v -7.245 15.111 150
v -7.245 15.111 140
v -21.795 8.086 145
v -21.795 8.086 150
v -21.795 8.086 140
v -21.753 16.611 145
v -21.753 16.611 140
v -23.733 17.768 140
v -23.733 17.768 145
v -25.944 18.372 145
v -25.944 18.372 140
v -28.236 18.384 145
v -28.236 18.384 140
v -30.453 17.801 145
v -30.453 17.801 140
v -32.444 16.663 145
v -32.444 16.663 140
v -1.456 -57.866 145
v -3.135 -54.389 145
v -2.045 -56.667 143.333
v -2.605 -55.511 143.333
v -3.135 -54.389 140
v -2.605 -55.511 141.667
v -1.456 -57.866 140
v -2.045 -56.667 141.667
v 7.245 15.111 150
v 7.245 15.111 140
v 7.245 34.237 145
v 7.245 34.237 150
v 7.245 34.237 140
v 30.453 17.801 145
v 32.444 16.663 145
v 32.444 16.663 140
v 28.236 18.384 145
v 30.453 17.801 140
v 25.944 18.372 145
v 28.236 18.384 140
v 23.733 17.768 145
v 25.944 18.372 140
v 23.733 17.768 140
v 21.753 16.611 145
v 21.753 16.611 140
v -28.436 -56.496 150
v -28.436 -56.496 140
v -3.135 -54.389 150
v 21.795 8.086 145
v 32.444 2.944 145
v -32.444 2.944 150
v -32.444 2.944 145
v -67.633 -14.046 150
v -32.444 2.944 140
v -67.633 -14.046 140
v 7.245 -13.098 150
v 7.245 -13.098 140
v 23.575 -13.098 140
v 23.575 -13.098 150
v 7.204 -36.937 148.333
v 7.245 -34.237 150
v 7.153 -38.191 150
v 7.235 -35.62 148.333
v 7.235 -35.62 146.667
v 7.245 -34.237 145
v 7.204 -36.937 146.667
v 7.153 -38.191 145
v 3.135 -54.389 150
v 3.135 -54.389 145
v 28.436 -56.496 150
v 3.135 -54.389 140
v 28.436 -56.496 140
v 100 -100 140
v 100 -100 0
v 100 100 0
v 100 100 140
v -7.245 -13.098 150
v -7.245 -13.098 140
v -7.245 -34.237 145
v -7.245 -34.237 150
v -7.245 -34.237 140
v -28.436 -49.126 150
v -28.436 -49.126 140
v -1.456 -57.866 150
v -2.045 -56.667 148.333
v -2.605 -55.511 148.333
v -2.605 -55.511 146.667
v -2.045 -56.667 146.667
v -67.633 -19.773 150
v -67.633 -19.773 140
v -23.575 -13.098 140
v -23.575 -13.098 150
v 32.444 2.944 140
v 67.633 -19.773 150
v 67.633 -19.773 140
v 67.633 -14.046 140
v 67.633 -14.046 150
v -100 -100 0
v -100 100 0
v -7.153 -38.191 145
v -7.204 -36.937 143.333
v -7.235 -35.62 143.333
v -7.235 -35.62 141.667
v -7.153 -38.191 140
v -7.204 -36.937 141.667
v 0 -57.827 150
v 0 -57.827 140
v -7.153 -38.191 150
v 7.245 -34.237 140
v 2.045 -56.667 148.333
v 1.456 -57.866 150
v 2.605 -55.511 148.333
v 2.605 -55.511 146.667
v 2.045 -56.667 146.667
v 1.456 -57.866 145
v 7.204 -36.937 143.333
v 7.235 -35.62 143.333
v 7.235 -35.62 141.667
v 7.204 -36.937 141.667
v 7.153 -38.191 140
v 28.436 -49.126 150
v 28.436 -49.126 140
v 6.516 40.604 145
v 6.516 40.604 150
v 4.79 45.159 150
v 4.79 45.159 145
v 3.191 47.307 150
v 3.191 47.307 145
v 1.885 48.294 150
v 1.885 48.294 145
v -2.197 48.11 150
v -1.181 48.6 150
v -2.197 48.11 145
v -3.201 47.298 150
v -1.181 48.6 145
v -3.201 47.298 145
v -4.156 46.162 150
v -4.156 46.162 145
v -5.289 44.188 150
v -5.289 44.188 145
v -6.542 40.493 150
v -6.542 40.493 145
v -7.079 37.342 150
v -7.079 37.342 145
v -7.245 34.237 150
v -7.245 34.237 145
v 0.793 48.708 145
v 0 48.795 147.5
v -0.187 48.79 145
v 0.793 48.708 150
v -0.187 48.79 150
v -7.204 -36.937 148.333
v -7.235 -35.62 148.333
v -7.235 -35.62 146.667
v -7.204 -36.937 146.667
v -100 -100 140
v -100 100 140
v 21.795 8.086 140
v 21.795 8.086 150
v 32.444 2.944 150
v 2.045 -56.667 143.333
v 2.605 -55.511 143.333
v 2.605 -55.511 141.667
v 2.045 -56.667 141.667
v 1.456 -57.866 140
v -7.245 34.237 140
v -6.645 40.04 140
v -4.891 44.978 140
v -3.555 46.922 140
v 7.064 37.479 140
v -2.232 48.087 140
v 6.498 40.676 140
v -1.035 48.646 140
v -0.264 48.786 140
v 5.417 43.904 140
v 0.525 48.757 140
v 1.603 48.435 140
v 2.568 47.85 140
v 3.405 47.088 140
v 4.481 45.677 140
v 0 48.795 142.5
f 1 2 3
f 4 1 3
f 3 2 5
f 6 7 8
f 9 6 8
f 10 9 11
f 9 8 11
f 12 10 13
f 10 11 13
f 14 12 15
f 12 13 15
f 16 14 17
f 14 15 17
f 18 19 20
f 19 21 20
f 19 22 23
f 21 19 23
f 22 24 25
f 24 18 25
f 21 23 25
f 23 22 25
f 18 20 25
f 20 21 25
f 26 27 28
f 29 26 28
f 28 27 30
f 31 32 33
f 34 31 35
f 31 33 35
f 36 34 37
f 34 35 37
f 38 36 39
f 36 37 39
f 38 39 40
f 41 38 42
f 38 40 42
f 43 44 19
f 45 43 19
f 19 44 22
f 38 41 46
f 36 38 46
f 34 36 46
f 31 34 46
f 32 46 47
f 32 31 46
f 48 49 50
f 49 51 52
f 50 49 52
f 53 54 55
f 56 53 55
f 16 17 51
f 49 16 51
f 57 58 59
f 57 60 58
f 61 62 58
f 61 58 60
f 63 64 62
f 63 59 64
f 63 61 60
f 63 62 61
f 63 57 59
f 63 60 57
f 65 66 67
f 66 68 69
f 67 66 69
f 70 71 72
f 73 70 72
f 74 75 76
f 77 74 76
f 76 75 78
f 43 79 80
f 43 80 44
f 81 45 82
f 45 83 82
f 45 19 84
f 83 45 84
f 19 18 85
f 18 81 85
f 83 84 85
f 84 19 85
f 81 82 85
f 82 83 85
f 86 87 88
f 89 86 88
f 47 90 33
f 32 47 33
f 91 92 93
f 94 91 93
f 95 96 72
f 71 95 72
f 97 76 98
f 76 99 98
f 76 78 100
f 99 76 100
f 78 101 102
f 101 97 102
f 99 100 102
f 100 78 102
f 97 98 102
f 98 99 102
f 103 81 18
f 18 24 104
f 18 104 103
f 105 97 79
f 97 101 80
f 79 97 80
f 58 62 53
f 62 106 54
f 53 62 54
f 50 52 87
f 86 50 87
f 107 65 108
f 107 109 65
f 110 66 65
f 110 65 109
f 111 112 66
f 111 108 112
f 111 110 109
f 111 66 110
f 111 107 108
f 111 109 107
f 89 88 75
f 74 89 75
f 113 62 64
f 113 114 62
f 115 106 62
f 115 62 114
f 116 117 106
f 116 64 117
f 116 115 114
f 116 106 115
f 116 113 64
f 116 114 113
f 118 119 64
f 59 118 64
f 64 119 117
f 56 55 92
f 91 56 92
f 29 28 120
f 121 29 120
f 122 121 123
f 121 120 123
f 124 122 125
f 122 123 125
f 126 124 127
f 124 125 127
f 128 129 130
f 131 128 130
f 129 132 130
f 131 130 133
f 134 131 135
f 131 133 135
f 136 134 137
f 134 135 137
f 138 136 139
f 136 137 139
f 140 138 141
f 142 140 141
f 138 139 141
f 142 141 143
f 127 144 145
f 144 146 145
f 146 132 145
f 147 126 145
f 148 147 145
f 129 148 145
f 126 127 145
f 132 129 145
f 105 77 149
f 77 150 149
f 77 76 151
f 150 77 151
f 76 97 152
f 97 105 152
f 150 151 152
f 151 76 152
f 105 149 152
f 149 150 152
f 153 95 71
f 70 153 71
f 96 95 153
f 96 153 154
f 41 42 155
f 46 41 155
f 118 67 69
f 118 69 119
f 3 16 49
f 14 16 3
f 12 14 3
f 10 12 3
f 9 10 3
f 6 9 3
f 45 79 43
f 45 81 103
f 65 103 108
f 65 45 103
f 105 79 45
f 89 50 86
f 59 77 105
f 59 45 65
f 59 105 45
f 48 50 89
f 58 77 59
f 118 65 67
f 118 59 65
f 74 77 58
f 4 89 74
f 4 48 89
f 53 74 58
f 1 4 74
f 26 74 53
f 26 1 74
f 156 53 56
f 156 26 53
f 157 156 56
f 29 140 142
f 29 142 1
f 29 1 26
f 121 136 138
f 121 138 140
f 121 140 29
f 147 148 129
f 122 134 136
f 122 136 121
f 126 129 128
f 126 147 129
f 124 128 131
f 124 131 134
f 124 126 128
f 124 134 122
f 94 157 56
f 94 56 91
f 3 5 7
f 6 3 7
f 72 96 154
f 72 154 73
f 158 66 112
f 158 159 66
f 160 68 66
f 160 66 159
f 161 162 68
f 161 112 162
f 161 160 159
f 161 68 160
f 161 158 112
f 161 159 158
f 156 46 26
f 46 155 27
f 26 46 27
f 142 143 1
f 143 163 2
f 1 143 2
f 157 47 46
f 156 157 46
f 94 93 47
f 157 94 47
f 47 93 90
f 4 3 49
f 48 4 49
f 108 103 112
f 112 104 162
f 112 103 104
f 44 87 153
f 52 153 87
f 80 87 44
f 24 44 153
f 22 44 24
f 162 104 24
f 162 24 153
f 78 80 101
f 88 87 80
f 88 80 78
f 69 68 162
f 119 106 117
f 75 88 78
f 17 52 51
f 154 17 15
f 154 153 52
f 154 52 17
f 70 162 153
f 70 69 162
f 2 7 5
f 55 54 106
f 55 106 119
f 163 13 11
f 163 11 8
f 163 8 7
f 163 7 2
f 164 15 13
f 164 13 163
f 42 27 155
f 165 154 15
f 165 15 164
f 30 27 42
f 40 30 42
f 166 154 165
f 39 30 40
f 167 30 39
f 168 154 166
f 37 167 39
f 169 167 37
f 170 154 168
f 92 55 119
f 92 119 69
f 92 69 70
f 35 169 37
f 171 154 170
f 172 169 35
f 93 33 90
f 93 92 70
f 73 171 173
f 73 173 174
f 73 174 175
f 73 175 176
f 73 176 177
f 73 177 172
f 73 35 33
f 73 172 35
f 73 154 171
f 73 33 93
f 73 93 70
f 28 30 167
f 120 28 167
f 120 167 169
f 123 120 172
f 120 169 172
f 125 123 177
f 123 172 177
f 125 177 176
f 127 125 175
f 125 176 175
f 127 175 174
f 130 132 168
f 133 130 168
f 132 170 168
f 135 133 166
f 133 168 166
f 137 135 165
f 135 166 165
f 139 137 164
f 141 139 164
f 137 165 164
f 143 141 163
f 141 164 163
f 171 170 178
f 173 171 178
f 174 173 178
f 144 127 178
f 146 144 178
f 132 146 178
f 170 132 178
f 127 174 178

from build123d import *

# Parameters (mm, degrees)
F0_W     = 200
F0_H     = 200
F1_DEPTH = 140
F2_DEPTH = 140
F3_DEPTH = 145
F4_DEPTH = 150
F5_DEPTH = 130


with BuildPart() as f1:
    # F0 (on Top) → F1 (new body)
    with BuildSketch(Plane.XY):
        Rectangle(F0_W, F0_H)
        with BuildLine():
            add(Edge.make_bspline(
                [(7.2454415782, 34.2370129494), (7.2454415782, 48.7951978413), (0, 48.7951978413), (-7.2454415782, 48.7951978413), (-7.2454415782, 34.2370129494)],
                knots=[4.7123889804, 4.7123889804, 4.7123889804, 6.2831853072, 6.2831853072, 7.853981634, 7.853981634, 7.853981634], degree=2, weights=[1, 0.7071067812, 1, 0.7071067812, 1]))
            Line((7.2454415782, 34.2370129494), (7.2454415782, 15.1109112501))
            Line((7.2454415782, 15.1109112501), (21.7954180783, 8.0856784731))
            Line((21.7954180783, 8.0856784731), (21.7534018032, 16.610871316))
            ThreePointArc((21.7534018032, 16.610871316), (27.0897500943, 18.4530874606), (32.4439415934, 16.6633928502))
            Line((32.4439415934, 16.6633928502), (32.4439415934, 2.9442023734))
            Line((32.4439415934, 2.9442023734), (67.6326961509, -14.0461475353))
            Line((67.6326961509, -14.0461475353), (67.6326961509, -19.7732619358))
            Line((67.6326961509, -19.7732619358), (23.5754315722, -13.0982023901))
            Line((23.5754315722, -13.0982023901), (7.2454415782, -13.0982023901))
            Line((7.2454415782, -13.0982023901), (7.2454415782, -34.2370129494))
            add(Edge.make_bspline(
                [(7.2454415782, -34.2370129494), (7.2454415782, -35.6548618262), (7.2142066873, -36.9668416965), (7.1527191063, -38.1911703848)],
                knots=[0, 0, 0, 0, 2.9587160624, 2.9587160624, 2.9587160624, 2.9587160624], degree=3))
            Line((7.1527191063, -38.1911703848), (28.4360707366, -49.1262911818))
            Line((28.4360707366, -49.1262911818), (28.4360707366, -56.4963517135))
            Line((28.4360707366, -56.4963517135), (3.1353018663, -54.3887936468))
            add(Edge.make_bspline(
                [(3.1353018663, -54.3887936468), (2.61930295, -55.4977071467), (2.0588825896, -56.641790632), (1.4564413795, -57.8655702387)],
                knots=[20.3419378234, 20.3419378234, 20.3419378234, 20.3419378234, 24.3273764075, 24.3273764075, 24.3273764075, 24.3273764075], degree=3))
            Line((1.4564413795, -57.8655702387), (0, -57.8274615109))
            Line((0, -57.8274615109), (-1.4564413795, -57.8655702387))
            add(Edge.make_bspline(
                [(-3.1353018663, -54.3887936468), (-2.61930295, -55.4977071467), (-2.0588825896, -56.641790632), (-1.4564413795, -57.8655702387)],
                knots=[20.3419378234, 20.3419378234, 20.3419378234, 20.3419378234, 24.3273764075, 24.3273764075, 24.3273764075, 24.3273764075], degree=3))
            Line((-3.1353018663, -54.3887936468), (-28.4360707366, -56.4963517135))
            Line((-28.4360707366, -56.4963517135), (-28.4360707366, -49.1262911818))
            Line((-28.4360707366, -49.1262911818), (-7.1527191063, -38.1911703848))
            add(Edge.make_bspline(
                [(-7.2454415782, -34.2370129494), (-7.2454415782, -35.6548618262), (-7.2142066873, -36.9668416965), (-7.1527191063, -38.1911703848)],
                knots=[0, 0, 0, 0, 2.9587160624, 2.9587160624, 2.9587160624, 2.9587160624], degree=3))
            Line((-7.2454415782, -34.2370129494), (-7.2454415782, -13.0982023901))
            Line((-7.2454415782, -13.0982023901), (-23.5754315722, -13.0982023901))
            Line((-23.5754315722, -13.0982023901), (-67.6326961509, -19.7732619358))
            Line((-67.6326961509, -19.7732619358), (-67.6326961509, -14.0461475353))
            Line((-67.6326961509, -14.0461475353), (-32.4439415934, 2.9442023734))
            Line((-32.4439415934, 2.9442023734), (-32.4439415934, 16.6633928502))
            ThreePointArc((-32.4439415934, 16.6633928502), (-27.0897500943, 18.4530874606), (-21.7534018032, 16.610871316))
            Line((-21.7534018032, 16.610871316), (-21.7954180783, 8.0856784731))
            Line((-21.7954180783, 8.0856784731), (-7.2454415782, 15.1109112501))
            Line((-7.2454415782, 15.1109112501), (-7.2454415782, 34.2370129494))
        make_face(mode=Mode.SUBTRACT)
        Polygon((-7.2454415782, -13.0982023901), (-7.2454415782, 15.1109112501), (-21.7954180783, 8.0856784731), (-32.4439415934, 2.9442023734), (-67.6326961509, -14.0461475353), (-67.6326961509, -19.7732619358), (-23.5754315722, -13.0982023901), align=None)
        with BuildLine():
            Line((-32.4439415934, 2.9442023734), (-21.7954180783, 8.0856784731))
            Line((-21.7954180783, 8.0856784731), (-21.7534018032, 16.610871316))
            ThreePointArc((-21.7534018032, 16.610871316), (-27.0897500943, 18.4530874606), (-32.4439415934, 16.6633928502))
            Line((-32.4439415934, 16.6633928502), (-32.4439415934, 2.9442023734))
        make_face()
        with BuildLine():
            add(Edge.make_bspline(
                [(-7.1527191063, -38.1911703848), (-6.791463672, -45.384417945), (-5.3859258319, -49.5520639177), (-3.1353018663, -54.3887936468)],
                knots=[2.9587160624, 2.9587160624, 2.9587160624, 2.9587160624, 20.3419378234, 20.3419378234, 20.3419378234, 20.3419378234], degree=3))
            Line((-7.1527191063, -38.1911703848), (-28.4360707366, -49.1262911818))
            Line((-28.4360707366, -49.1262911818), (-28.4360707366, -56.4963517135))
            Line((-28.4360707366, -56.4963517135), (-3.1353018663, -54.3887936468))
        make_face()
        with BuildLine():
            Line((28.4360707366, -49.1262911818), (7.1527191063, -38.1911703848))
            add(Edge.make_bspline(
                [(7.1527191063, -38.1911703848), (6.791463672, -45.384417945), (5.3859258319, -49.5520639177), (3.1353018663, -54.3887936468)],
                knots=[2.9587160624, 2.9587160624, 2.9587160624, 2.9587160624, 20.3419378234, 20.3419378234, 20.3419378234, 20.3419378234], degree=3))
            Line((3.1353018663, -54.3887936468), (28.4360707366, -56.4963517135))
            Line((28.4360707366, -56.4963517135), (28.4360707366, -49.1262911818))
        make_face()
        with BuildLine():
            Line((21.7534018032, 16.610871316), (21.7954180783, 8.0856784731))
            Line((21.7954180783, 8.0856784731), (32.4439415934, 2.9442023734))
            Line((32.4439415934, 2.9442023734), (32.4439415934, 16.6633928502))
            ThreePointArc((32.4439415934, 16.6633928502), (27.0897500943, 18.4530874606), (21.7534018032, 16.610871316))
        make_face()
    extrude(amount=F1_DEPTH)

    # F0 (on Top) → F2 (join)
    with BuildSketch(Plane.XY):
        with BuildLine():
            Line((7.2454415782, 15.1109112501), (7.2454415782, 34.2370129494))
            add(Edge.make_bspline(
                [(7.2454415782, 34.2370129494), (7.2454415782, 48.7951978413), (0, 48.7951978413), (-7.2454415782, 48.7951978413), (-7.2454415782, 34.2370129494)],
                knots=[4.7123889804, 4.7123889804, 4.7123889804, 6.2831853072, 6.2831853072, 7.853981634, 7.853981634, 7.853981634], degree=2, weights=[1, 0.7071067812, 1, 0.7071067812, 1]))
            Line((-7.2454415782, 34.2370129494), (-7.2454415782, 15.1109112501))
            Line((-7.2454415782, 15.1109112501), (-7.2454415782, -13.0982023901))
            Line((-7.2454415782, -13.0982023901), (-7.2454415782, -34.2370129494))
            add(Edge.make_bspline(
                [(-7.2454415782, -34.2370129494), (-7.2454415782, -35.6548618262), (-7.2142066873, -36.9668416965), (-7.1527191063, -38.1911703848)],
                knots=[0, 0, 0, 0, 2.9587160624, 2.9587160624, 2.9587160624, 2.9587160624], degree=3))
            add(Edge.make_bspline(
                [(-7.1527191063, -38.1911703848), (-6.791463672, -45.384417945), (-5.3859258319, -49.5520639177), (-3.1353018663, -54.3887936468)],
                knots=[2.9587160624, 2.9587160624, 2.9587160624, 2.9587160624, 20.3419378234, 20.3419378234, 20.3419378234, 20.3419378234], degree=3))
            add(Edge.make_bspline(
                [(-3.1353018663, -54.3887936468), (-2.61930295, -55.4977071467), (-2.0588825896, -56.641790632), (-1.4564413795, -57.8655702387)],
                knots=[20.3419378234, 20.3419378234, 20.3419378234, 20.3419378234, 24.3273764075, 24.3273764075, 24.3273764075, 24.3273764075], degree=3))
            Line((-1.4564413795, -57.8655702387), (0, -57.8274615109))
            Line((0, -57.8274615109), (1.4564413795, -57.8655702387))
            add(Edge.make_bspline(
                [(3.1353018663, -54.3887936468), (2.61930295, -55.4977071467), (2.0588825896, -56.641790632), (1.4564413795, -57.8655702387)],
                knots=[20.3419378234, 20.3419378234, 20.3419378234, 20.3419378234, 24.3273764075, 24.3273764075, 24.3273764075, 24.3273764075], degree=3))
            add(Edge.make_bspline(
                [(7.1527191063, -38.1911703848), (6.791463672, -45.384417945), (5.3859258319, -49.5520639177), (3.1353018663, -54.3887936468)],
                knots=[2.9587160624, 2.9587160624, 2.9587160624, 2.9587160624, 20.3419378234, 20.3419378234, 20.3419378234, 20.3419378234], degree=3))
            add(Edge.make_bspline(
                [(7.2454415782, -34.2370129494), (7.2454415782, -35.6548618262), (7.2142066873, -36.9668416965), (7.1527191063, -38.1911703848)],
                knots=[0, 0, 0, 0, 2.9587160624, 2.9587160624, 2.9587160624, 2.9587160624], degree=3))
            Line((7.2454415782, -34.2370129494), (7.2454415782, -13.0982023901))
            Line((7.2454415782, -13.0982023901), (7.2454415782, 15.1109112501))
        make_face()
        Polygon((21.7954180783, 8.0856784731), (7.2454415782, 15.1109112501), (7.2454415782, -13.0982023901), (23.5754315722, -13.0982023901), (67.6326961509, -19.7732619358), (67.6326961509, -14.0461475353), (32.4439415934, 2.9442023734), align=None)
    extrude(amount=F2_DEPTH)

    # F0 (on Top) → F3 (join)
    with BuildSketch(Plane.XY):
        Polygon((-7.2454415782, -13.0982023901), (-7.2454415782, 15.1109112501), (-21.7954180783, 8.0856784731), (-32.4439415934, 2.9442023734), (-67.6326961509, -14.0461475353), (-67.6326961509, -19.7732619358), (-23.5754315722, -13.0982023901), align=None)
        with BuildLine():
            Line((-32.4439415934, 2.9442023734), (-21.7954180783, 8.0856784731))
            Line((-21.7954180783, 8.0856784731), (-21.7534018032, 16.610871316))
            ThreePointArc((-21.7534018032, 16.610871316), (-27.0897500943, 18.4530874606), (-32.4439415934, 16.6633928502))
            Line((-32.4439415934, 16.6633928502), (-32.4439415934, 2.9442023734))
        make_face()
        with BuildLine():
            Line((7.2454415782, 15.1109112501), (7.2454415782, 34.2370129494))
            add(Edge.make_bspline(
                [(7.2454415782, 34.2370129494), (7.2454415782, 48.7951978413), (0, 48.7951978413), (-7.2454415782, 48.7951978413), (-7.2454415782, 34.2370129494)],
                knots=[4.7123889804, 4.7123889804, 4.7123889804, 6.2831853072, 6.2831853072, 7.853981634, 7.853981634, 7.853981634], degree=2, weights=[1, 0.7071067812, 1, 0.7071067812, 1]))
            Line((-7.2454415782, 34.2370129494), (-7.2454415782, 15.1109112501))
            Line((-7.2454415782, 15.1109112501), (-7.2454415782, -13.0982023901))
            Line((-7.2454415782, -13.0982023901), (-7.2454415782, -34.2370129494))
            add(Edge.make_bspline(
                [(-7.2454415782, -34.2370129494), (-7.2454415782, -35.6548618262), (-7.2142066873, -36.9668416965), (-7.1527191063, -38.1911703848)],
                knots=[0, 0, 0, 0, 2.9587160624, 2.9587160624, 2.9587160624, 2.9587160624], degree=3))
            add(Edge.make_bspline(
                [(-7.1527191063, -38.1911703848), (-6.791463672, -45.384417945), (-5.3859258319, -49.5520639177), (-3.1353018663, -54.3887936468)],
                knots=[2.9587160624, 2.9587160624, 2.9587160624, 2.9587160624, 20.3419378234, 20.3419378234, 20.3419378234, 20.3419378234], degree=3))
            add(Edge.make_bspline(
                [(-3.1353018663, -54.3887936468), (-2.61930295, -55.4977071467), (-2.0588825896, -56.641790632), (-1.4564413795, -57.8655702387)],
                knots=[20.3419378234, 20.3419378234, 20.3419378234, 20.3419378234, 24.3273764075, 24.3273764075, 24.3273764075, 24.3273764075], degree=3))
            Line((-1.4564413795, -57.8655702387), (0, -57.8274615109))
            Line((0, -57.8274615109), (1.4564413795, -57.8655702387))
            add(Edge.make_bspline(
                [(3.1353018663, -54.3887936468), (2.61930295, -55.4977071467), (2.0588825896, -56.641790632), (1.4564413795, -57.8655702387)],
                knots=[20.3419378234, 20.3419378234, 20.3419378234, 20.3419378234, 24.3273764075, 24.3273764075, 24.3273764075, 24.3273764075], degree=3))
            add(Edge.make_bspline(
                [(7.1527191063, -38.1911703848), (6.791463672, -45.384417945), (5.3859258319, -49.5520639177), (3.1353018663, -54.3887936468)],
                knots=[2.9587160624, 2.9587160624, 2.9587160624, 2.9587160624, 20.3419378234, 20.3419378234, 20.3419378234, 20.3419378234], degree=3))
            add(Edge.make_bspline(
                [(7.2454415782, -34.2370129494), (7.2454415782, -35.6548618262), (7.2142066873, -36.9668416965), (7.1527191063, -38.1911703848)],
                knots=[0, 0, 0, 0, 2.9587160624, 2.9587160624, 2.9587160624, 2.9587160624], degree=3))
            Line((7.2454415782, -34.2370129494), (7.2454415782, -13.0982023901))
            Line((7.2454415782, -13.0982023901), (7.2454415782, 15.1109112501))
        make_face()
        Polygon((21.7954180783, 8.0856784731), (7.2454415782, 15.1109112501), (7.2454415782, -13.0982023901), (23.5754315722, -13.0982023901), (67.6326961509, -19.7732619358), (67.6326961509, -14.0461475353), (32.4439415934, 2.9442023734), align=None)
        with BuildLine():
            Line((21.7534018032, 16.610871316), (21.7954180783, 8.0856784731))
            Line((21.7954180783, 8.0856784731), (32.4439415934, 2.9442023734))
            Line((32.4439415934, 2.9442023734), (32.4439415934, 16.6633928502))
            ThreePointArc((32.4439415934, 16.6633928502), (27.0897500943, 18.4530874606), (21.7534018032, 16.610871316))
        make_face()
        with BuildLine():
            Line((28.4360707366, -49.1262911818), (7.1527191063, -38.1911703848))
            add(Edge.make_bspline(
                [(7.1527191063, -38.1911703848), (6.791463672, -45.384417945), (5.3859258319, -49.5520639177), (3.1353018663, -54.3887936468)],
                knots=[2.9587160624, 2.9587160624, 2.9587160624, 2.9587160624, 20.3419378234, 20.3419378234, 20.3419378234, 20.3419378234], degree=3))
            Line((3.1353018663, -54.3887936468), (28.4360707366, -56.4963517135))
            Line((28.4360707366, -56.4963517135), (28.4360707366, -49.1262911818))
        make_face()
        with BuildLine():
            add(Edge.make_bspline(
                [(-7.1527191063, -38.1911703848), (-6.791463672, -45.384417945), (-5.3859258319, -49.5520639177), (-3.1353018663, -54.3887936468)],
                knots=[2.9587160624, 2.9587160624, 2.9587160624, 2.9587160624, 20.3419378234, 20.3419378234, 20.3419378234, 20.3419378234], degree=3))
            Line((-7.1527191063, -38.1911703848), (-28.4360707366, -49.1262911818))
            Line((-28.4360707366, -49.1262911818), (-28.4360707366, -56.4963517135))
            Line((-28.4360707366, -56.4963517135), (-3.1353018663, -54.3887936468))
        make_face()
    extrude(amount=F3_DEPTH)

    # F0 (on Top) → F4 (join)
    with BuildSketch(Plane.XY):
        with BuildLine():
            Line((7.2454415782, 15.1109112501), (7.2454415782, 34.2370129494))
            add(Edge.make_bspline(
                [(7.2454415782, 34.2370129494), (7.2454415782, 48.7951978413), (0, 48.7951978413), (-7.2454415782, 48.7951978413), (-7.2454415782, 34.2370129494)],
                knots=[4.7123889804, 4.7123889804, 4.7123889804, 6.2831853072, 6.2831853072, 7.853981634, 7.853981634, 7.853981634], degree=2, weights=[1, 0.7071067812, 1, 0.7071067812, 1]))
            Line((-7.2454415782, 34.2370129494), (-7.2454415782, 15.1109112501))
            Line((-7.2454415782, 15.1109112501), (-7.2454415782, -13.0982023901))
            Line((-7.2454415782, -13.0982023901), (-7.2454415782, -34.2370129494))
            add(Edge.make_bspline(
                [(-7.2454415782, -34.2370129494), (-7.2454415782, -35.6548618262), (-7.2142066873, -36.9668416965), (-7.1527191063, -38.1911703848)],
                knots=[0, 0, 0, 0, 2.9587160624, 2.9587160624, 2.9587160624, 2.9587160624], degree=3))
            add(Edge.make_bspline(
                [(-7.1527191063, -38.1911703848), (-6.791463672, -45.384417945), (-5.3859258319, -49.5520639177), (-3.1353018663, -54.3887936468)],
                knots=[2.9587160624, 2.9587160624, 2.9587160624, 2.9587160624, 20.3419378234, 20.3419378234, 20.3419378234, 20.3419378234], degree=3))
            add(Edge.make_bspline(
                [(-3.1353018663, -54.3887936468), (-2.61930295, -55.4977071467), (-2.0588825896, -56.641790632), (-1.4564413795, -57.8655702387)],
                knots=[20.3419378234, 20.3419378234, 20.3419378234, 20.3419378234, 24.3273764075, 24.3273764075, 24.3273764075, 24.3273764075], degree=3))
            Line((-1.4564413795, -57.8655702387), (0, -57.8274615109))
            Line((0, -57.8274615109), (1.4564413795, -57.8655702387))
            add(Edge.make_bspline(
                [(3.1353018663, -54.3887936468), (2.61930295, -55.4977071467), (2.0588825896, -56.641790632), (1.4564413795, -57.8655702387)],
                knots=[20.3419378234, 20.3419378234, 20.3419378234, 20.3419378234, 24.3273764075, 24.3273764075, 24.3273764075, 24.3273764075], degree=3))
            add(Edge.make_bspline(
                [(7.1527191063, -38.1911703848), (6.791463672, -45.384417945), (5.3859258319, -49.5520639177), (3.1353018663, -54.3887936468)],
                knots=[2.9587160624, 2.9587160624, 2.9587160624, 2.9587160624, 20.3419378234, 20.3419378234, 20.3419378234, 20.3419378234], degree=3))
            add(Edge.make_bspline(
                [(7.2454415782, -34.2370129494), (7.2454415782, -35.6548618262), (7.2142066873, -36.9668416965), (7.1527191063, -38.1911703848)],
                knots=[0, 0, 0, 0, 2.9587160624, 2.9587160624, 2.9587160624, 2.9587160624], degree=3))
            Line((7.2454415782, -34.2370129494), (7.2454415782, -13.0982023901))
            Line((7.2454415782, -13.0982023901), (7.2454415782, 15.1109112501))
        make_face()
        Polygon((21.7954180783, 8.0856784731), (7.2454415782, 15.1109112501), (7.2454415782, -13.0982023901), (23.5754315722, -13.0982023901), (67.6326961509, -19.7732619358), (67.6326961509, -14.0461475353), (32.4439415934, 2.9442023734), align=None)
        Polygon((-7.2454415782, -13.0982023901), (-7.2454415782, 15.1109112501), (-21.7954180783, 8.0856784731), (-32.4439415934, 2.9442023734), (-67.6326961509, -14.0461475353), (-67.6326961509, -19.7732619358), (-23.5754315722, -13.0982023901), align=None)
        with BuildLine():
            Line((28.4360707366, -49.1262911818), (7.1527191063, -38.1911703848))
            add(Edge.make_bspline(
                [(7.1527191063, -38.1911703848), (6.791463672, -45.384417945), (5.3859258319, -49.5520639177), (3.1353018663, -54.3887936468)],
                knots=[2.9587160624, 2.9587160624, 2.9587160624, 2.9587160624, 20.3419378234, 20.3419378234, 20.3419378234, 20.3419378234], degree=3))
            Line((3.1353018663, -54.3887936468), (28.4360707366, -56.4963517135))
            Line((28.4360707366, -56.4963517135), (28.4360707366, -49.1262911818))
        make_face()
        with BuildLine():
            add(Edge.make_bspline(
                [(-7.1527191063, -38.1911703848), (-6.791463672, -45.384417945), (-5.3859258319, -49.5520639177), (-3.1353018663, -54.3887936468)],
                knots=[2.9587160624, 2.9587160624, 2.9587160624, 2.9587160624, 20.3419378234, 20.3419378234, 20.3419378234, 20.3419378234], degree=3))
            Line((-7.1527191063, -38.1911703848), (-28.4360707366, -49.1262911818))
            Line((-28.4360707366, -49.1262911818), (-28.4360707366, -56.4963517135))
            Line((-28.4360707366, -56.4963517135), (-3.1353018663, -54.3887936468))
        make_face()
    extrude(amount=F4_DEPTH)

    # F0 (on Top) → F5 (join)
    with BuildSketch(Plane.XY):
        with BuildLine():
            Line((7.2454415782, 15.1109112501), (7.2454415782, 34.2370129494))
            add(Edge.make_bspline(
                [(7.2454415782, 34.2370129494), (7.2454415782, 48.7951978413), (0, 48.7951978413), (-7.2454415782, 48.7951978413), (-7.2454415782, 34.2370129494)],
                knots=[4.7123889804, 4.7123889804, 4.7123889804, 6.2831853072, 6.2831853072, 7.853981634, 7.853981634, 7.853981634], degree=2, weights=[1, 0.7071067812, 1, 0.7071067812, 1]))
            Line((-7.2454415782, 34.2370129494), (-7.2454415782, 15.1109112501))
            Line((-7.2454415782, 15.1109112501), (-7.2454415782, -13.0982023901))
            Line((-7.2454415782, -13.0982023901), (-7.2454415782, -34.2370129494))
            add(Edge.make_bspline(
                [(-7.2454415782, -34.2370129494), (-7.2454415782, -35.6548618262), (-7.2142066873, -36.9668416965), (-7.1527191063, -38.1911703848)],
                knots=[0, 0, 0, 0, 2.9587160624, 2.9587160624, 2.9587160624, 2.9587160624], degree=3))
            add(Edge.make_bspline(
                [(-7.1527191063, -38.1911703848), (-6.791463672, -45.384417945), (-5.3859258319, -49.5520639177), (-3.1353018663, -54.3887936468)],
                knots=[2.9587160624, 2.9587160624, 2.9587160624, 2.9587160624, 20.3419378234, 20.3419378234, 20.3419378234, 20.3419378234], degree=3))
            add(Edge.make_bspline(
                [(-3.1353018663, -54.3887936468), (-2.61930295, -55.4977071467), (-2.0588825896, -56.641790632), (-1.4564413795, -57.8655702387)],
                knots=[20.3419378234, 20.3419378234, 20.3419378234, 20.3419378234, 24.3273764075, 24.3273764075, 24.3273764075, 24.3273764075], degree=3))
            Line((-1.4564413795, -57.8655702387), (0, -57.8274615109))
            Line((0, -57.8274615109), (1.4564413795, -57.8655702387))
            add(Edge.make_bspline(
                [(3.1353018663, -54.3887936468), (2.61930295, -55.4977071467), (2.0588825896, -56.641790632), (1.4564413795, -57.8655702387)],
                knots=[20.3419378234, 20.3419378234, 20.3419378234, 20.3419378234, 24.3273764075, 24.3273764075, 24.3273764075, 24.3273764075], degree=3))
            add(Edge.make_bspline(
                [(7.1527191063, -38.1911703848), (6.791463672, -45.384417945), (5.3859258319, -49.5520639177), (3.1353018663, -54.3887936468)],
                knots=[2.9587160624, 2.9587160624, 2.9587160624, 2.9587160624, 20.3419378234, 20.3419378234, 20.3419378234, 20.3419378234], degree=3))
            add(Edge.make_bspline(
                [(7.2454415782, -34.2370129494), (7.2454415782, -35.6548618262), (7.2142066873, -36.9668416965), (7.1527191063, -38.1911703848)],
                knots=[0, 0, 0, 0, 2.9587160624, 2.9587160624, 2.9587160624, 2.9587160624], degree=3))
            Line((7.2454415782, -34.2370129494), (7.2454415782, -13.0982023901))
            Line((7.2454415782, -13.0982023901), (7.2454415782, 15.1109112501))
        make_face()
    extrude(amount=F5_DEPTH)


solid = f1.part
